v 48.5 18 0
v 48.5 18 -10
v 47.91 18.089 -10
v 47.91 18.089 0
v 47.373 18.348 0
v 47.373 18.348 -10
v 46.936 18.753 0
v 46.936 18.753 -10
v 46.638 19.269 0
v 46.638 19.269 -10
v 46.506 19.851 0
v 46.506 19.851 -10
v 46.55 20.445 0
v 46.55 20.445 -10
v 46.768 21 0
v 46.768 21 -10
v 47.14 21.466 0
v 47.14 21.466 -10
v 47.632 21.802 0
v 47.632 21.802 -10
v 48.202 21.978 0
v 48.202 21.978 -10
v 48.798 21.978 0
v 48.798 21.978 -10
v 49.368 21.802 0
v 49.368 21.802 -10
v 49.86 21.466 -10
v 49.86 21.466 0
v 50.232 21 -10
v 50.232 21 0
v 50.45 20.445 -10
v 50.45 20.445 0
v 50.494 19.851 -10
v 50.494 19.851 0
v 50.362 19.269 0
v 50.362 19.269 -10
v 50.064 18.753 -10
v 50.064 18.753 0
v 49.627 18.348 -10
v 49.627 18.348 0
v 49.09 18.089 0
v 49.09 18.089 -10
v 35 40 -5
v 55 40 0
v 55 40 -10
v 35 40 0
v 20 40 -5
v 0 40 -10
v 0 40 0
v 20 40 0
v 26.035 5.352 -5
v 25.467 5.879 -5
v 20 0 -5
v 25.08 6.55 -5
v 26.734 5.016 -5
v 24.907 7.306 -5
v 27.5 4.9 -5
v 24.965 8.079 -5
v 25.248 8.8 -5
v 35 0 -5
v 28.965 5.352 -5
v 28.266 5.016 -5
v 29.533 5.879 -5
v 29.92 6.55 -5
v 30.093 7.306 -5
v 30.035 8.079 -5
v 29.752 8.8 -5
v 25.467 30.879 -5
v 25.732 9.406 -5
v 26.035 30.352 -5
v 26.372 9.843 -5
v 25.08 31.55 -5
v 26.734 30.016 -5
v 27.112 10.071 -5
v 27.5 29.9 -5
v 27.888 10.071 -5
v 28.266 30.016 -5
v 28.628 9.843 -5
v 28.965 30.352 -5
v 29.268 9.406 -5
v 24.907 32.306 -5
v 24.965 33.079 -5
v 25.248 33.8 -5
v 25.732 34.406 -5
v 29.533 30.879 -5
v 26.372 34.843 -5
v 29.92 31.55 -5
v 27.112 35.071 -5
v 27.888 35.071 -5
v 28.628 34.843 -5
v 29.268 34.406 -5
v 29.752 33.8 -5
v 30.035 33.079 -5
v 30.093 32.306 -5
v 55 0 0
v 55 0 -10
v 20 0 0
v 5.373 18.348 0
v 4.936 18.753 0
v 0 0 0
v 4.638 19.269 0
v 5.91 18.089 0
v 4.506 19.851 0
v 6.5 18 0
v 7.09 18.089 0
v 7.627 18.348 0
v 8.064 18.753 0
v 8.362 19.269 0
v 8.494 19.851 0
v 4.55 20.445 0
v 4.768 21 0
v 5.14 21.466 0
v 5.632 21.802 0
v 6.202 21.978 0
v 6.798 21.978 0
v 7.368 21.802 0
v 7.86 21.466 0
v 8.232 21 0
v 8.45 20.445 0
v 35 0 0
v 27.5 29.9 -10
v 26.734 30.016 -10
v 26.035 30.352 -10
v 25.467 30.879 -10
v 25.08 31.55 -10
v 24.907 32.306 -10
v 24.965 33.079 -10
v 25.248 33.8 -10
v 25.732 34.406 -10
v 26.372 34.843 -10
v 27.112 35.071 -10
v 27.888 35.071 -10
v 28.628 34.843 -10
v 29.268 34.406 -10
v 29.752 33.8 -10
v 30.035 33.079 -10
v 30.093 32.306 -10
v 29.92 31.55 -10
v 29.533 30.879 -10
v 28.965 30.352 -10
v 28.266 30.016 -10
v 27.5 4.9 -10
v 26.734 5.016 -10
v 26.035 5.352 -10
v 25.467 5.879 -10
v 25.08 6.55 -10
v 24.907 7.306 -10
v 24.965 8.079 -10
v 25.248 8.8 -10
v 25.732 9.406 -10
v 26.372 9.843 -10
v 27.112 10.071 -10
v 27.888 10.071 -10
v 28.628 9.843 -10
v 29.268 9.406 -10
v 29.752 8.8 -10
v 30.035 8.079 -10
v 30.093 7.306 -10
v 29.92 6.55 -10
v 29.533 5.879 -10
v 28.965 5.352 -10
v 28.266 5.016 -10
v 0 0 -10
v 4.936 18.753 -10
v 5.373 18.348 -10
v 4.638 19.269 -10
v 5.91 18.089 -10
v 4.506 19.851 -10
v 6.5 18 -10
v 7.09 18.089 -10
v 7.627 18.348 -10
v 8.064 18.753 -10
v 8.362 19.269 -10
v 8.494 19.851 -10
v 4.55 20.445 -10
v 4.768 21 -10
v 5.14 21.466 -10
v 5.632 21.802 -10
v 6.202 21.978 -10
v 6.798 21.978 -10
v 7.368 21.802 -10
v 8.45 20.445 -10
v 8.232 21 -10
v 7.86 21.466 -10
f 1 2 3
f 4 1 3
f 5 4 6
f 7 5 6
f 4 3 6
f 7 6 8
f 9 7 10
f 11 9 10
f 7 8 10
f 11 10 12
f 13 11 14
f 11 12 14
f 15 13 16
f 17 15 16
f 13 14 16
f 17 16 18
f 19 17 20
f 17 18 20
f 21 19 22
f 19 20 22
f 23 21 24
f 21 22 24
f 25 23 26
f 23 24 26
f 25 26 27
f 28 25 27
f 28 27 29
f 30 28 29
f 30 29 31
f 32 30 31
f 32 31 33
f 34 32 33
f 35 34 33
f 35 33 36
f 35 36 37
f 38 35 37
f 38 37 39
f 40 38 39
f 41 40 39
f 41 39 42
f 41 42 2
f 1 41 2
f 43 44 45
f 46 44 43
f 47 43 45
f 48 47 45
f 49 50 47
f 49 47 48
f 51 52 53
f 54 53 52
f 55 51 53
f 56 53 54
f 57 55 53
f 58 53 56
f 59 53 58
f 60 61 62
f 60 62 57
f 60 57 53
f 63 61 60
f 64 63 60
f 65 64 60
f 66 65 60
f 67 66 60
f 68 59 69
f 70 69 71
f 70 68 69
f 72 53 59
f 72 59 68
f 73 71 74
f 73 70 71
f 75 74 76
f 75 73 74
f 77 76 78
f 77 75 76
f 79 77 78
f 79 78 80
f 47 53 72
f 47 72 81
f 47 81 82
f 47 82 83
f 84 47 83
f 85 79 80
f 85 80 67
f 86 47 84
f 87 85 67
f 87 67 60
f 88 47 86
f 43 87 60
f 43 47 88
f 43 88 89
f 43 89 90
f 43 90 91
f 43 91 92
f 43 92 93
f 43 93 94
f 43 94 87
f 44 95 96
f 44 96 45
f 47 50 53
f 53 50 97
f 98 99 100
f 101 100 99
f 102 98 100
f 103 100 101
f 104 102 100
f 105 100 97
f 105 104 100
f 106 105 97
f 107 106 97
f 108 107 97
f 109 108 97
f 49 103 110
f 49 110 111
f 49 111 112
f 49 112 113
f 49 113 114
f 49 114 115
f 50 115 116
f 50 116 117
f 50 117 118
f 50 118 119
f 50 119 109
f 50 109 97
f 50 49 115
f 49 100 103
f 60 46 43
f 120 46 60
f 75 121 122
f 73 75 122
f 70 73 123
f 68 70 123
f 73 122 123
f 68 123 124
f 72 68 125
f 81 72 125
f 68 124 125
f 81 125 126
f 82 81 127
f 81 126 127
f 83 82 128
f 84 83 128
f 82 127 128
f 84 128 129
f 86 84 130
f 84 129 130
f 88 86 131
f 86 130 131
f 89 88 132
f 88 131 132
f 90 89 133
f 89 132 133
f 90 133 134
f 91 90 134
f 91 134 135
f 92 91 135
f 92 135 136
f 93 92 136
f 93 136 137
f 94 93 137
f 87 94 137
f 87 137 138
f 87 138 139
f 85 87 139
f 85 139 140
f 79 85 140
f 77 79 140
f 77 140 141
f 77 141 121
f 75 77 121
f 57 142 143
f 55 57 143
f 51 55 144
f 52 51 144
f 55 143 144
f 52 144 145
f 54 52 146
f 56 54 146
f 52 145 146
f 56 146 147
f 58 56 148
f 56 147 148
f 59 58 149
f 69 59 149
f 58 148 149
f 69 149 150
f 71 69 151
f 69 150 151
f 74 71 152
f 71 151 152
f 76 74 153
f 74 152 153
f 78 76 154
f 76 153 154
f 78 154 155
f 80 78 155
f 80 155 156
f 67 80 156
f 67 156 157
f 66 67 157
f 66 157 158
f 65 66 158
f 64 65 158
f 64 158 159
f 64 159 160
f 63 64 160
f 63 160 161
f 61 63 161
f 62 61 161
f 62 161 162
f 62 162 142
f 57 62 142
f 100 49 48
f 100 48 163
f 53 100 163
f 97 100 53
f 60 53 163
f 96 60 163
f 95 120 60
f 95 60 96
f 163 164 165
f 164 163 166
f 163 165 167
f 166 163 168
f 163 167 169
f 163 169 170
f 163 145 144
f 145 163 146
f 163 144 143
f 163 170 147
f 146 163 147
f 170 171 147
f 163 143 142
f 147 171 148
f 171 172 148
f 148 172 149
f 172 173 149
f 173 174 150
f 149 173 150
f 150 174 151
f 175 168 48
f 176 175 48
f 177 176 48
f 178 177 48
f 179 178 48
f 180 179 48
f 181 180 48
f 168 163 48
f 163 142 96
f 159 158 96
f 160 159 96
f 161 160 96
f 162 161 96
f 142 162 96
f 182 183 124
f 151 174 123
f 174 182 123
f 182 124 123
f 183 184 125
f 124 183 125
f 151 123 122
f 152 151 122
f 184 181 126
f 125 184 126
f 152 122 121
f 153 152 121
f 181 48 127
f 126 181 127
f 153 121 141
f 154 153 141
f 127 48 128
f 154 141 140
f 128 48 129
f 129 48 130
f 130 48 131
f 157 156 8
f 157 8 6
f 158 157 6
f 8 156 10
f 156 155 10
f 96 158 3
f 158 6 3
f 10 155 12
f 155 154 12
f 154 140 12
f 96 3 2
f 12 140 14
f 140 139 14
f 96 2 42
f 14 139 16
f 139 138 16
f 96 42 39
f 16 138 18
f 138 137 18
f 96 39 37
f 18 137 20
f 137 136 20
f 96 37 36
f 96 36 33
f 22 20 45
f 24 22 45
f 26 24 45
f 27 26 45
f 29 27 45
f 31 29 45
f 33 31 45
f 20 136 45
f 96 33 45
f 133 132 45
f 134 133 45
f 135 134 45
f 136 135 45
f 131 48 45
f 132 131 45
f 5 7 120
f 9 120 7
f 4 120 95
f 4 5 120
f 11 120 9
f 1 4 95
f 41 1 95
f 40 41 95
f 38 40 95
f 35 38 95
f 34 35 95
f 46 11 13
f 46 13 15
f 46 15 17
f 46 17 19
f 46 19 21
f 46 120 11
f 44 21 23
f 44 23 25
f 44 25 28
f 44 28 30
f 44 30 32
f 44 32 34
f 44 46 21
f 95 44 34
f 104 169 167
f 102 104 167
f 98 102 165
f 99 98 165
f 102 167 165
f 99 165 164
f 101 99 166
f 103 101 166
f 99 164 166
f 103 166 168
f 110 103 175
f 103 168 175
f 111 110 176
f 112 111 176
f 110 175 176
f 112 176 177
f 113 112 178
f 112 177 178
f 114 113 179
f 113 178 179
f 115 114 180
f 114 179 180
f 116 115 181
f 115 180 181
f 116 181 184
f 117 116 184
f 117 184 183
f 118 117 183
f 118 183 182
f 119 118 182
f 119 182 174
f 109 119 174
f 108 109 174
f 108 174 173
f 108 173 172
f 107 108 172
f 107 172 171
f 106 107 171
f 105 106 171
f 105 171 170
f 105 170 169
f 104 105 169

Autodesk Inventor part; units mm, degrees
ref_plane "YZ Plane" through (0, 0, 0) normal (1, 0, 0) x (0, 1, 0)
ref_plane "XZ Plane" through (0, 0, 0) normal (0, 1, 0) x (-1, 0, 0)
ref_plane "XY Plane" through (0, 0, 0) normal (0, 0, 1) x (1, 0, 0)
sketch "Sketch2" plane through (0, 0, 0) normal (0, 0, 1) x (1, 0, 0)
  line L0 (0, 0) -> (55, 0)
  line L1 (55, 0) -> (55, 40)
  line L2 (55, 40) -> (0, 40)
  line L3 (0, 40) -> (0, 0)
  line L4 (35, 40) -> (35, 0)
  line L5 (20, 40) -> (20, 0)
  line L6 (0, 20) -> (55, 20) construction
  line L7 (27.5, 0) -> (27.5, 40) construction
  circle A0 centre (6.5, 20) radius 2
  circle A1 centre (48.5, 20) radius 2
  circle A2 centre (27.5, 7.5) radius 2.6
  circle A3 centre (27.5, 32.5) radius 2.6
  point P0 (27.5, 7.5)
  point P1 (6.5, 20)
  point P2 (27.5, 32.5)
  dimension "d19" = 55
  dimension "d20" = 40
  dimension "d21" = 20
  dimension "d23" = 6.5
  dimension "d24" = 7.5
  dimension "d25" = 4
  dimension "d26" = 5.2
extrude "Extrusion1" add sketch "Sketch2" against normal blind 10 contours L3 L2 L5 L0 | L5 L2 L4 L0 | L4 L2 L1 L0 | A0 | A1 | A2 | A3
extrude "Extrusion2" cut sketch "Sketch2" against normal blind 5 contours L5 L2 L4 L0
hole "Hole1" at (6.5, 20, 0) at (48.5, 20, 0) direction (0, 0, -1) diameter 4 end through all
hole "Hole2" at (27.5, 7.5, 0) at (27.5, 32.5, 0) direction (0, 0, -1) diameter 5.2 end through all
thread "Thread3" size "M4x0.7" class "6H" standard "ISO Metric profile" full length
thread "Thread4" size "M4x0.7" class "6H" standard "ISO Metric profile" full length
properties part number "Leadscrew Bearing Bracket" material "Stainless Steel"
